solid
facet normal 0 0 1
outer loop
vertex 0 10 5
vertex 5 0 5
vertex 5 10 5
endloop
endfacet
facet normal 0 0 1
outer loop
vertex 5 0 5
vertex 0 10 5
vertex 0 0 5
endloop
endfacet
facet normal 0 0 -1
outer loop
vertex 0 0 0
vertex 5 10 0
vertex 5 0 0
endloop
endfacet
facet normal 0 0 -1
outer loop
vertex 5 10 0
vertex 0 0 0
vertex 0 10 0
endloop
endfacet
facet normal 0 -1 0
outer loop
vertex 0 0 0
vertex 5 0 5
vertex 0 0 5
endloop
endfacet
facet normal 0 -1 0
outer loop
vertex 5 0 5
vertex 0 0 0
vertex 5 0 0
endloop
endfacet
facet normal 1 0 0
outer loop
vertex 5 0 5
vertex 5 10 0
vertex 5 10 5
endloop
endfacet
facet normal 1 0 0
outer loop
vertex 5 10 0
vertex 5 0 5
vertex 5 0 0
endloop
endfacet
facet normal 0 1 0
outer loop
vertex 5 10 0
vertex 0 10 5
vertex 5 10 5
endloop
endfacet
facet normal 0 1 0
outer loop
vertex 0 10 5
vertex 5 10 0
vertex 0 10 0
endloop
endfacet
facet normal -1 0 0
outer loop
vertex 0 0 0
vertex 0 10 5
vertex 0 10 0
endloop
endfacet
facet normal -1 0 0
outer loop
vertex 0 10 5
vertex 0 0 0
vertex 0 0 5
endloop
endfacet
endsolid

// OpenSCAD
// Generated by generate_scads.py
cube(size=[5,10,5], center=false);
